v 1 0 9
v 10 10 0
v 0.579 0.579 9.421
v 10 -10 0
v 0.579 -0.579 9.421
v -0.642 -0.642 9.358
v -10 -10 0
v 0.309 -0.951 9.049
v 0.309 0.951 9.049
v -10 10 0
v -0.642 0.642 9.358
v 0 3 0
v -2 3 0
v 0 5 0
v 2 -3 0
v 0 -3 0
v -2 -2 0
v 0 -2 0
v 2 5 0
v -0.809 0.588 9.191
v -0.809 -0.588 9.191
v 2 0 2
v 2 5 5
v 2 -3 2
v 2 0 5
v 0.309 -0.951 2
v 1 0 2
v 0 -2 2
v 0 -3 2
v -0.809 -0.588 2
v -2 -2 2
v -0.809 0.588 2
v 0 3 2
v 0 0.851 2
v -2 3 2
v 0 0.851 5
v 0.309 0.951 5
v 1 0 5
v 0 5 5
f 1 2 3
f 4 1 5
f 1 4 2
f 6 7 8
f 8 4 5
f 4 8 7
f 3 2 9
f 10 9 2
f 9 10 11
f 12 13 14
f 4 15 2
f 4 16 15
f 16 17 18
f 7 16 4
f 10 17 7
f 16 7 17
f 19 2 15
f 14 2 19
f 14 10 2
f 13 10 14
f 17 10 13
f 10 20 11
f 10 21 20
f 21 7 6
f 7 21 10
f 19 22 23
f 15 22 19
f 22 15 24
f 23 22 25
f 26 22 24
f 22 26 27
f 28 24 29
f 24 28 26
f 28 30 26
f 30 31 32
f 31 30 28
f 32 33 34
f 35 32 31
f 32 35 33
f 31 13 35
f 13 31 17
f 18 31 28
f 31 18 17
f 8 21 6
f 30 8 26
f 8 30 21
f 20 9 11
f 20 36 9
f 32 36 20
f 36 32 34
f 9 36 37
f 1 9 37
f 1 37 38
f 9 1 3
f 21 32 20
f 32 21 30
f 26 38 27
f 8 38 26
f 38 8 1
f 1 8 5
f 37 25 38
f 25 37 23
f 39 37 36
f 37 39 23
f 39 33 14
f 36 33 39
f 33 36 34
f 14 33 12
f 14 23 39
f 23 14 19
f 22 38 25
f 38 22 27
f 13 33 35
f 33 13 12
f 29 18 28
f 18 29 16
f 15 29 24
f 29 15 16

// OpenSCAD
difference(){
    polyhedron(
  points=[ [10,10,0],[10,-10,0],[-10,-10,0],[-10,10,0], // the four points at base
           [0,0,10]  ],                                 // the apex point 
  faces=[ [0,1,4],[1,2,4],[2,3,4],[3,0,4],              // each triangle side
              [1,0,3],[2,1,3] ]                         // two triangles for square base
 );
    cube(size=4,center=true);
    cylinder(h=40,r=1,center=true);
    cube([2,5,5]);
mirror([1,0,0]) cube([2,3,2]);
mirror([0,1,0]) cube([2,3,2]);
mirror([0,0,1]) cube([2,3,2]);
    }
